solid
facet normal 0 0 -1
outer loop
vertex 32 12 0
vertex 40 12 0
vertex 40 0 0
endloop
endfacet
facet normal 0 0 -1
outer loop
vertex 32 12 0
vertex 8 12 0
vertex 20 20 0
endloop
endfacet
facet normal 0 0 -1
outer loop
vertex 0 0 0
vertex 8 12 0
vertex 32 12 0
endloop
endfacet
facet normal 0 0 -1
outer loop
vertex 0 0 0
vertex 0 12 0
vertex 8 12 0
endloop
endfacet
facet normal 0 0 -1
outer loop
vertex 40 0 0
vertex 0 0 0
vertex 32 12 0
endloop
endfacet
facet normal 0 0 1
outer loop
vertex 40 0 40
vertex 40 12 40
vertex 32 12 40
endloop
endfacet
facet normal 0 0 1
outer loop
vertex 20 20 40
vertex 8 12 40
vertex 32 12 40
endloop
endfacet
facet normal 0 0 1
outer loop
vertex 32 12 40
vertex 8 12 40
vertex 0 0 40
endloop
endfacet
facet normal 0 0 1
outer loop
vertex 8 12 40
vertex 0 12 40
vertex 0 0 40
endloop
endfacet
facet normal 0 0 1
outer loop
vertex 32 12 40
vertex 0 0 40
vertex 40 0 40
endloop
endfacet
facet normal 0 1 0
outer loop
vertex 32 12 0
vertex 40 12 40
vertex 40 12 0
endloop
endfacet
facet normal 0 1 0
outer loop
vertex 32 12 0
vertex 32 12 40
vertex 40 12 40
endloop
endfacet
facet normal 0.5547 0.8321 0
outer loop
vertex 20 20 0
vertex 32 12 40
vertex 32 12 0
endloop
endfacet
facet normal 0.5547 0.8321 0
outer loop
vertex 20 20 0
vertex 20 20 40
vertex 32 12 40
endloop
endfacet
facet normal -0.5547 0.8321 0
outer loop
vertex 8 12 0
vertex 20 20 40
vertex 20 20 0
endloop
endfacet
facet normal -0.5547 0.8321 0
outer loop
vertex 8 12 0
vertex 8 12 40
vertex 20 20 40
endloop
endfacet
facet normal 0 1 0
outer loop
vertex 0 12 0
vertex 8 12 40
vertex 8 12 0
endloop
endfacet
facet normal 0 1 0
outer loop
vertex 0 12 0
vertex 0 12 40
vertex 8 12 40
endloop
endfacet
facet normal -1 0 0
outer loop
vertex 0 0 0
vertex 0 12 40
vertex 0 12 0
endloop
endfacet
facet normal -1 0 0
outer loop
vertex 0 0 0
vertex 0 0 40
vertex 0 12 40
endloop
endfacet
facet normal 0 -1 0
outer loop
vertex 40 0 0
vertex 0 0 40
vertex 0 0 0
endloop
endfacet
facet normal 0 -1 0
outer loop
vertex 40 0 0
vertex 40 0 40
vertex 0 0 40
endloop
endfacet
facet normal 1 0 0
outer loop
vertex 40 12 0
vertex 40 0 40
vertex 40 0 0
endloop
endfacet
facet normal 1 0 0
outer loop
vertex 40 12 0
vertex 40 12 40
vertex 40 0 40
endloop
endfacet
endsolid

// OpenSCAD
$fn = 32;

// ----------------------------------------------------------------------
// V guide rail: vrib, 40 mm wide
// ----------------------------------------------------------------------

// --- parameters (mm) ---
rail_w = 40;              // rail width, X
base_t = 12;              // base plate thickness
v_depth = 8;              // V feature depth / height
v_half_w = 12;            // half width of the V at the base face
plate_t = 40;             // rail length, Z (the extrusion height)

profile = [[0, 0], [40, 0], [40, 12], [32, 12], [20, 20], [8, 12], [0, 12]];  // primary outline, 7 points, counter clockwise

// --- the one profile operation ---
linear_extrude(height = plate_t) polygon(points = profile);
